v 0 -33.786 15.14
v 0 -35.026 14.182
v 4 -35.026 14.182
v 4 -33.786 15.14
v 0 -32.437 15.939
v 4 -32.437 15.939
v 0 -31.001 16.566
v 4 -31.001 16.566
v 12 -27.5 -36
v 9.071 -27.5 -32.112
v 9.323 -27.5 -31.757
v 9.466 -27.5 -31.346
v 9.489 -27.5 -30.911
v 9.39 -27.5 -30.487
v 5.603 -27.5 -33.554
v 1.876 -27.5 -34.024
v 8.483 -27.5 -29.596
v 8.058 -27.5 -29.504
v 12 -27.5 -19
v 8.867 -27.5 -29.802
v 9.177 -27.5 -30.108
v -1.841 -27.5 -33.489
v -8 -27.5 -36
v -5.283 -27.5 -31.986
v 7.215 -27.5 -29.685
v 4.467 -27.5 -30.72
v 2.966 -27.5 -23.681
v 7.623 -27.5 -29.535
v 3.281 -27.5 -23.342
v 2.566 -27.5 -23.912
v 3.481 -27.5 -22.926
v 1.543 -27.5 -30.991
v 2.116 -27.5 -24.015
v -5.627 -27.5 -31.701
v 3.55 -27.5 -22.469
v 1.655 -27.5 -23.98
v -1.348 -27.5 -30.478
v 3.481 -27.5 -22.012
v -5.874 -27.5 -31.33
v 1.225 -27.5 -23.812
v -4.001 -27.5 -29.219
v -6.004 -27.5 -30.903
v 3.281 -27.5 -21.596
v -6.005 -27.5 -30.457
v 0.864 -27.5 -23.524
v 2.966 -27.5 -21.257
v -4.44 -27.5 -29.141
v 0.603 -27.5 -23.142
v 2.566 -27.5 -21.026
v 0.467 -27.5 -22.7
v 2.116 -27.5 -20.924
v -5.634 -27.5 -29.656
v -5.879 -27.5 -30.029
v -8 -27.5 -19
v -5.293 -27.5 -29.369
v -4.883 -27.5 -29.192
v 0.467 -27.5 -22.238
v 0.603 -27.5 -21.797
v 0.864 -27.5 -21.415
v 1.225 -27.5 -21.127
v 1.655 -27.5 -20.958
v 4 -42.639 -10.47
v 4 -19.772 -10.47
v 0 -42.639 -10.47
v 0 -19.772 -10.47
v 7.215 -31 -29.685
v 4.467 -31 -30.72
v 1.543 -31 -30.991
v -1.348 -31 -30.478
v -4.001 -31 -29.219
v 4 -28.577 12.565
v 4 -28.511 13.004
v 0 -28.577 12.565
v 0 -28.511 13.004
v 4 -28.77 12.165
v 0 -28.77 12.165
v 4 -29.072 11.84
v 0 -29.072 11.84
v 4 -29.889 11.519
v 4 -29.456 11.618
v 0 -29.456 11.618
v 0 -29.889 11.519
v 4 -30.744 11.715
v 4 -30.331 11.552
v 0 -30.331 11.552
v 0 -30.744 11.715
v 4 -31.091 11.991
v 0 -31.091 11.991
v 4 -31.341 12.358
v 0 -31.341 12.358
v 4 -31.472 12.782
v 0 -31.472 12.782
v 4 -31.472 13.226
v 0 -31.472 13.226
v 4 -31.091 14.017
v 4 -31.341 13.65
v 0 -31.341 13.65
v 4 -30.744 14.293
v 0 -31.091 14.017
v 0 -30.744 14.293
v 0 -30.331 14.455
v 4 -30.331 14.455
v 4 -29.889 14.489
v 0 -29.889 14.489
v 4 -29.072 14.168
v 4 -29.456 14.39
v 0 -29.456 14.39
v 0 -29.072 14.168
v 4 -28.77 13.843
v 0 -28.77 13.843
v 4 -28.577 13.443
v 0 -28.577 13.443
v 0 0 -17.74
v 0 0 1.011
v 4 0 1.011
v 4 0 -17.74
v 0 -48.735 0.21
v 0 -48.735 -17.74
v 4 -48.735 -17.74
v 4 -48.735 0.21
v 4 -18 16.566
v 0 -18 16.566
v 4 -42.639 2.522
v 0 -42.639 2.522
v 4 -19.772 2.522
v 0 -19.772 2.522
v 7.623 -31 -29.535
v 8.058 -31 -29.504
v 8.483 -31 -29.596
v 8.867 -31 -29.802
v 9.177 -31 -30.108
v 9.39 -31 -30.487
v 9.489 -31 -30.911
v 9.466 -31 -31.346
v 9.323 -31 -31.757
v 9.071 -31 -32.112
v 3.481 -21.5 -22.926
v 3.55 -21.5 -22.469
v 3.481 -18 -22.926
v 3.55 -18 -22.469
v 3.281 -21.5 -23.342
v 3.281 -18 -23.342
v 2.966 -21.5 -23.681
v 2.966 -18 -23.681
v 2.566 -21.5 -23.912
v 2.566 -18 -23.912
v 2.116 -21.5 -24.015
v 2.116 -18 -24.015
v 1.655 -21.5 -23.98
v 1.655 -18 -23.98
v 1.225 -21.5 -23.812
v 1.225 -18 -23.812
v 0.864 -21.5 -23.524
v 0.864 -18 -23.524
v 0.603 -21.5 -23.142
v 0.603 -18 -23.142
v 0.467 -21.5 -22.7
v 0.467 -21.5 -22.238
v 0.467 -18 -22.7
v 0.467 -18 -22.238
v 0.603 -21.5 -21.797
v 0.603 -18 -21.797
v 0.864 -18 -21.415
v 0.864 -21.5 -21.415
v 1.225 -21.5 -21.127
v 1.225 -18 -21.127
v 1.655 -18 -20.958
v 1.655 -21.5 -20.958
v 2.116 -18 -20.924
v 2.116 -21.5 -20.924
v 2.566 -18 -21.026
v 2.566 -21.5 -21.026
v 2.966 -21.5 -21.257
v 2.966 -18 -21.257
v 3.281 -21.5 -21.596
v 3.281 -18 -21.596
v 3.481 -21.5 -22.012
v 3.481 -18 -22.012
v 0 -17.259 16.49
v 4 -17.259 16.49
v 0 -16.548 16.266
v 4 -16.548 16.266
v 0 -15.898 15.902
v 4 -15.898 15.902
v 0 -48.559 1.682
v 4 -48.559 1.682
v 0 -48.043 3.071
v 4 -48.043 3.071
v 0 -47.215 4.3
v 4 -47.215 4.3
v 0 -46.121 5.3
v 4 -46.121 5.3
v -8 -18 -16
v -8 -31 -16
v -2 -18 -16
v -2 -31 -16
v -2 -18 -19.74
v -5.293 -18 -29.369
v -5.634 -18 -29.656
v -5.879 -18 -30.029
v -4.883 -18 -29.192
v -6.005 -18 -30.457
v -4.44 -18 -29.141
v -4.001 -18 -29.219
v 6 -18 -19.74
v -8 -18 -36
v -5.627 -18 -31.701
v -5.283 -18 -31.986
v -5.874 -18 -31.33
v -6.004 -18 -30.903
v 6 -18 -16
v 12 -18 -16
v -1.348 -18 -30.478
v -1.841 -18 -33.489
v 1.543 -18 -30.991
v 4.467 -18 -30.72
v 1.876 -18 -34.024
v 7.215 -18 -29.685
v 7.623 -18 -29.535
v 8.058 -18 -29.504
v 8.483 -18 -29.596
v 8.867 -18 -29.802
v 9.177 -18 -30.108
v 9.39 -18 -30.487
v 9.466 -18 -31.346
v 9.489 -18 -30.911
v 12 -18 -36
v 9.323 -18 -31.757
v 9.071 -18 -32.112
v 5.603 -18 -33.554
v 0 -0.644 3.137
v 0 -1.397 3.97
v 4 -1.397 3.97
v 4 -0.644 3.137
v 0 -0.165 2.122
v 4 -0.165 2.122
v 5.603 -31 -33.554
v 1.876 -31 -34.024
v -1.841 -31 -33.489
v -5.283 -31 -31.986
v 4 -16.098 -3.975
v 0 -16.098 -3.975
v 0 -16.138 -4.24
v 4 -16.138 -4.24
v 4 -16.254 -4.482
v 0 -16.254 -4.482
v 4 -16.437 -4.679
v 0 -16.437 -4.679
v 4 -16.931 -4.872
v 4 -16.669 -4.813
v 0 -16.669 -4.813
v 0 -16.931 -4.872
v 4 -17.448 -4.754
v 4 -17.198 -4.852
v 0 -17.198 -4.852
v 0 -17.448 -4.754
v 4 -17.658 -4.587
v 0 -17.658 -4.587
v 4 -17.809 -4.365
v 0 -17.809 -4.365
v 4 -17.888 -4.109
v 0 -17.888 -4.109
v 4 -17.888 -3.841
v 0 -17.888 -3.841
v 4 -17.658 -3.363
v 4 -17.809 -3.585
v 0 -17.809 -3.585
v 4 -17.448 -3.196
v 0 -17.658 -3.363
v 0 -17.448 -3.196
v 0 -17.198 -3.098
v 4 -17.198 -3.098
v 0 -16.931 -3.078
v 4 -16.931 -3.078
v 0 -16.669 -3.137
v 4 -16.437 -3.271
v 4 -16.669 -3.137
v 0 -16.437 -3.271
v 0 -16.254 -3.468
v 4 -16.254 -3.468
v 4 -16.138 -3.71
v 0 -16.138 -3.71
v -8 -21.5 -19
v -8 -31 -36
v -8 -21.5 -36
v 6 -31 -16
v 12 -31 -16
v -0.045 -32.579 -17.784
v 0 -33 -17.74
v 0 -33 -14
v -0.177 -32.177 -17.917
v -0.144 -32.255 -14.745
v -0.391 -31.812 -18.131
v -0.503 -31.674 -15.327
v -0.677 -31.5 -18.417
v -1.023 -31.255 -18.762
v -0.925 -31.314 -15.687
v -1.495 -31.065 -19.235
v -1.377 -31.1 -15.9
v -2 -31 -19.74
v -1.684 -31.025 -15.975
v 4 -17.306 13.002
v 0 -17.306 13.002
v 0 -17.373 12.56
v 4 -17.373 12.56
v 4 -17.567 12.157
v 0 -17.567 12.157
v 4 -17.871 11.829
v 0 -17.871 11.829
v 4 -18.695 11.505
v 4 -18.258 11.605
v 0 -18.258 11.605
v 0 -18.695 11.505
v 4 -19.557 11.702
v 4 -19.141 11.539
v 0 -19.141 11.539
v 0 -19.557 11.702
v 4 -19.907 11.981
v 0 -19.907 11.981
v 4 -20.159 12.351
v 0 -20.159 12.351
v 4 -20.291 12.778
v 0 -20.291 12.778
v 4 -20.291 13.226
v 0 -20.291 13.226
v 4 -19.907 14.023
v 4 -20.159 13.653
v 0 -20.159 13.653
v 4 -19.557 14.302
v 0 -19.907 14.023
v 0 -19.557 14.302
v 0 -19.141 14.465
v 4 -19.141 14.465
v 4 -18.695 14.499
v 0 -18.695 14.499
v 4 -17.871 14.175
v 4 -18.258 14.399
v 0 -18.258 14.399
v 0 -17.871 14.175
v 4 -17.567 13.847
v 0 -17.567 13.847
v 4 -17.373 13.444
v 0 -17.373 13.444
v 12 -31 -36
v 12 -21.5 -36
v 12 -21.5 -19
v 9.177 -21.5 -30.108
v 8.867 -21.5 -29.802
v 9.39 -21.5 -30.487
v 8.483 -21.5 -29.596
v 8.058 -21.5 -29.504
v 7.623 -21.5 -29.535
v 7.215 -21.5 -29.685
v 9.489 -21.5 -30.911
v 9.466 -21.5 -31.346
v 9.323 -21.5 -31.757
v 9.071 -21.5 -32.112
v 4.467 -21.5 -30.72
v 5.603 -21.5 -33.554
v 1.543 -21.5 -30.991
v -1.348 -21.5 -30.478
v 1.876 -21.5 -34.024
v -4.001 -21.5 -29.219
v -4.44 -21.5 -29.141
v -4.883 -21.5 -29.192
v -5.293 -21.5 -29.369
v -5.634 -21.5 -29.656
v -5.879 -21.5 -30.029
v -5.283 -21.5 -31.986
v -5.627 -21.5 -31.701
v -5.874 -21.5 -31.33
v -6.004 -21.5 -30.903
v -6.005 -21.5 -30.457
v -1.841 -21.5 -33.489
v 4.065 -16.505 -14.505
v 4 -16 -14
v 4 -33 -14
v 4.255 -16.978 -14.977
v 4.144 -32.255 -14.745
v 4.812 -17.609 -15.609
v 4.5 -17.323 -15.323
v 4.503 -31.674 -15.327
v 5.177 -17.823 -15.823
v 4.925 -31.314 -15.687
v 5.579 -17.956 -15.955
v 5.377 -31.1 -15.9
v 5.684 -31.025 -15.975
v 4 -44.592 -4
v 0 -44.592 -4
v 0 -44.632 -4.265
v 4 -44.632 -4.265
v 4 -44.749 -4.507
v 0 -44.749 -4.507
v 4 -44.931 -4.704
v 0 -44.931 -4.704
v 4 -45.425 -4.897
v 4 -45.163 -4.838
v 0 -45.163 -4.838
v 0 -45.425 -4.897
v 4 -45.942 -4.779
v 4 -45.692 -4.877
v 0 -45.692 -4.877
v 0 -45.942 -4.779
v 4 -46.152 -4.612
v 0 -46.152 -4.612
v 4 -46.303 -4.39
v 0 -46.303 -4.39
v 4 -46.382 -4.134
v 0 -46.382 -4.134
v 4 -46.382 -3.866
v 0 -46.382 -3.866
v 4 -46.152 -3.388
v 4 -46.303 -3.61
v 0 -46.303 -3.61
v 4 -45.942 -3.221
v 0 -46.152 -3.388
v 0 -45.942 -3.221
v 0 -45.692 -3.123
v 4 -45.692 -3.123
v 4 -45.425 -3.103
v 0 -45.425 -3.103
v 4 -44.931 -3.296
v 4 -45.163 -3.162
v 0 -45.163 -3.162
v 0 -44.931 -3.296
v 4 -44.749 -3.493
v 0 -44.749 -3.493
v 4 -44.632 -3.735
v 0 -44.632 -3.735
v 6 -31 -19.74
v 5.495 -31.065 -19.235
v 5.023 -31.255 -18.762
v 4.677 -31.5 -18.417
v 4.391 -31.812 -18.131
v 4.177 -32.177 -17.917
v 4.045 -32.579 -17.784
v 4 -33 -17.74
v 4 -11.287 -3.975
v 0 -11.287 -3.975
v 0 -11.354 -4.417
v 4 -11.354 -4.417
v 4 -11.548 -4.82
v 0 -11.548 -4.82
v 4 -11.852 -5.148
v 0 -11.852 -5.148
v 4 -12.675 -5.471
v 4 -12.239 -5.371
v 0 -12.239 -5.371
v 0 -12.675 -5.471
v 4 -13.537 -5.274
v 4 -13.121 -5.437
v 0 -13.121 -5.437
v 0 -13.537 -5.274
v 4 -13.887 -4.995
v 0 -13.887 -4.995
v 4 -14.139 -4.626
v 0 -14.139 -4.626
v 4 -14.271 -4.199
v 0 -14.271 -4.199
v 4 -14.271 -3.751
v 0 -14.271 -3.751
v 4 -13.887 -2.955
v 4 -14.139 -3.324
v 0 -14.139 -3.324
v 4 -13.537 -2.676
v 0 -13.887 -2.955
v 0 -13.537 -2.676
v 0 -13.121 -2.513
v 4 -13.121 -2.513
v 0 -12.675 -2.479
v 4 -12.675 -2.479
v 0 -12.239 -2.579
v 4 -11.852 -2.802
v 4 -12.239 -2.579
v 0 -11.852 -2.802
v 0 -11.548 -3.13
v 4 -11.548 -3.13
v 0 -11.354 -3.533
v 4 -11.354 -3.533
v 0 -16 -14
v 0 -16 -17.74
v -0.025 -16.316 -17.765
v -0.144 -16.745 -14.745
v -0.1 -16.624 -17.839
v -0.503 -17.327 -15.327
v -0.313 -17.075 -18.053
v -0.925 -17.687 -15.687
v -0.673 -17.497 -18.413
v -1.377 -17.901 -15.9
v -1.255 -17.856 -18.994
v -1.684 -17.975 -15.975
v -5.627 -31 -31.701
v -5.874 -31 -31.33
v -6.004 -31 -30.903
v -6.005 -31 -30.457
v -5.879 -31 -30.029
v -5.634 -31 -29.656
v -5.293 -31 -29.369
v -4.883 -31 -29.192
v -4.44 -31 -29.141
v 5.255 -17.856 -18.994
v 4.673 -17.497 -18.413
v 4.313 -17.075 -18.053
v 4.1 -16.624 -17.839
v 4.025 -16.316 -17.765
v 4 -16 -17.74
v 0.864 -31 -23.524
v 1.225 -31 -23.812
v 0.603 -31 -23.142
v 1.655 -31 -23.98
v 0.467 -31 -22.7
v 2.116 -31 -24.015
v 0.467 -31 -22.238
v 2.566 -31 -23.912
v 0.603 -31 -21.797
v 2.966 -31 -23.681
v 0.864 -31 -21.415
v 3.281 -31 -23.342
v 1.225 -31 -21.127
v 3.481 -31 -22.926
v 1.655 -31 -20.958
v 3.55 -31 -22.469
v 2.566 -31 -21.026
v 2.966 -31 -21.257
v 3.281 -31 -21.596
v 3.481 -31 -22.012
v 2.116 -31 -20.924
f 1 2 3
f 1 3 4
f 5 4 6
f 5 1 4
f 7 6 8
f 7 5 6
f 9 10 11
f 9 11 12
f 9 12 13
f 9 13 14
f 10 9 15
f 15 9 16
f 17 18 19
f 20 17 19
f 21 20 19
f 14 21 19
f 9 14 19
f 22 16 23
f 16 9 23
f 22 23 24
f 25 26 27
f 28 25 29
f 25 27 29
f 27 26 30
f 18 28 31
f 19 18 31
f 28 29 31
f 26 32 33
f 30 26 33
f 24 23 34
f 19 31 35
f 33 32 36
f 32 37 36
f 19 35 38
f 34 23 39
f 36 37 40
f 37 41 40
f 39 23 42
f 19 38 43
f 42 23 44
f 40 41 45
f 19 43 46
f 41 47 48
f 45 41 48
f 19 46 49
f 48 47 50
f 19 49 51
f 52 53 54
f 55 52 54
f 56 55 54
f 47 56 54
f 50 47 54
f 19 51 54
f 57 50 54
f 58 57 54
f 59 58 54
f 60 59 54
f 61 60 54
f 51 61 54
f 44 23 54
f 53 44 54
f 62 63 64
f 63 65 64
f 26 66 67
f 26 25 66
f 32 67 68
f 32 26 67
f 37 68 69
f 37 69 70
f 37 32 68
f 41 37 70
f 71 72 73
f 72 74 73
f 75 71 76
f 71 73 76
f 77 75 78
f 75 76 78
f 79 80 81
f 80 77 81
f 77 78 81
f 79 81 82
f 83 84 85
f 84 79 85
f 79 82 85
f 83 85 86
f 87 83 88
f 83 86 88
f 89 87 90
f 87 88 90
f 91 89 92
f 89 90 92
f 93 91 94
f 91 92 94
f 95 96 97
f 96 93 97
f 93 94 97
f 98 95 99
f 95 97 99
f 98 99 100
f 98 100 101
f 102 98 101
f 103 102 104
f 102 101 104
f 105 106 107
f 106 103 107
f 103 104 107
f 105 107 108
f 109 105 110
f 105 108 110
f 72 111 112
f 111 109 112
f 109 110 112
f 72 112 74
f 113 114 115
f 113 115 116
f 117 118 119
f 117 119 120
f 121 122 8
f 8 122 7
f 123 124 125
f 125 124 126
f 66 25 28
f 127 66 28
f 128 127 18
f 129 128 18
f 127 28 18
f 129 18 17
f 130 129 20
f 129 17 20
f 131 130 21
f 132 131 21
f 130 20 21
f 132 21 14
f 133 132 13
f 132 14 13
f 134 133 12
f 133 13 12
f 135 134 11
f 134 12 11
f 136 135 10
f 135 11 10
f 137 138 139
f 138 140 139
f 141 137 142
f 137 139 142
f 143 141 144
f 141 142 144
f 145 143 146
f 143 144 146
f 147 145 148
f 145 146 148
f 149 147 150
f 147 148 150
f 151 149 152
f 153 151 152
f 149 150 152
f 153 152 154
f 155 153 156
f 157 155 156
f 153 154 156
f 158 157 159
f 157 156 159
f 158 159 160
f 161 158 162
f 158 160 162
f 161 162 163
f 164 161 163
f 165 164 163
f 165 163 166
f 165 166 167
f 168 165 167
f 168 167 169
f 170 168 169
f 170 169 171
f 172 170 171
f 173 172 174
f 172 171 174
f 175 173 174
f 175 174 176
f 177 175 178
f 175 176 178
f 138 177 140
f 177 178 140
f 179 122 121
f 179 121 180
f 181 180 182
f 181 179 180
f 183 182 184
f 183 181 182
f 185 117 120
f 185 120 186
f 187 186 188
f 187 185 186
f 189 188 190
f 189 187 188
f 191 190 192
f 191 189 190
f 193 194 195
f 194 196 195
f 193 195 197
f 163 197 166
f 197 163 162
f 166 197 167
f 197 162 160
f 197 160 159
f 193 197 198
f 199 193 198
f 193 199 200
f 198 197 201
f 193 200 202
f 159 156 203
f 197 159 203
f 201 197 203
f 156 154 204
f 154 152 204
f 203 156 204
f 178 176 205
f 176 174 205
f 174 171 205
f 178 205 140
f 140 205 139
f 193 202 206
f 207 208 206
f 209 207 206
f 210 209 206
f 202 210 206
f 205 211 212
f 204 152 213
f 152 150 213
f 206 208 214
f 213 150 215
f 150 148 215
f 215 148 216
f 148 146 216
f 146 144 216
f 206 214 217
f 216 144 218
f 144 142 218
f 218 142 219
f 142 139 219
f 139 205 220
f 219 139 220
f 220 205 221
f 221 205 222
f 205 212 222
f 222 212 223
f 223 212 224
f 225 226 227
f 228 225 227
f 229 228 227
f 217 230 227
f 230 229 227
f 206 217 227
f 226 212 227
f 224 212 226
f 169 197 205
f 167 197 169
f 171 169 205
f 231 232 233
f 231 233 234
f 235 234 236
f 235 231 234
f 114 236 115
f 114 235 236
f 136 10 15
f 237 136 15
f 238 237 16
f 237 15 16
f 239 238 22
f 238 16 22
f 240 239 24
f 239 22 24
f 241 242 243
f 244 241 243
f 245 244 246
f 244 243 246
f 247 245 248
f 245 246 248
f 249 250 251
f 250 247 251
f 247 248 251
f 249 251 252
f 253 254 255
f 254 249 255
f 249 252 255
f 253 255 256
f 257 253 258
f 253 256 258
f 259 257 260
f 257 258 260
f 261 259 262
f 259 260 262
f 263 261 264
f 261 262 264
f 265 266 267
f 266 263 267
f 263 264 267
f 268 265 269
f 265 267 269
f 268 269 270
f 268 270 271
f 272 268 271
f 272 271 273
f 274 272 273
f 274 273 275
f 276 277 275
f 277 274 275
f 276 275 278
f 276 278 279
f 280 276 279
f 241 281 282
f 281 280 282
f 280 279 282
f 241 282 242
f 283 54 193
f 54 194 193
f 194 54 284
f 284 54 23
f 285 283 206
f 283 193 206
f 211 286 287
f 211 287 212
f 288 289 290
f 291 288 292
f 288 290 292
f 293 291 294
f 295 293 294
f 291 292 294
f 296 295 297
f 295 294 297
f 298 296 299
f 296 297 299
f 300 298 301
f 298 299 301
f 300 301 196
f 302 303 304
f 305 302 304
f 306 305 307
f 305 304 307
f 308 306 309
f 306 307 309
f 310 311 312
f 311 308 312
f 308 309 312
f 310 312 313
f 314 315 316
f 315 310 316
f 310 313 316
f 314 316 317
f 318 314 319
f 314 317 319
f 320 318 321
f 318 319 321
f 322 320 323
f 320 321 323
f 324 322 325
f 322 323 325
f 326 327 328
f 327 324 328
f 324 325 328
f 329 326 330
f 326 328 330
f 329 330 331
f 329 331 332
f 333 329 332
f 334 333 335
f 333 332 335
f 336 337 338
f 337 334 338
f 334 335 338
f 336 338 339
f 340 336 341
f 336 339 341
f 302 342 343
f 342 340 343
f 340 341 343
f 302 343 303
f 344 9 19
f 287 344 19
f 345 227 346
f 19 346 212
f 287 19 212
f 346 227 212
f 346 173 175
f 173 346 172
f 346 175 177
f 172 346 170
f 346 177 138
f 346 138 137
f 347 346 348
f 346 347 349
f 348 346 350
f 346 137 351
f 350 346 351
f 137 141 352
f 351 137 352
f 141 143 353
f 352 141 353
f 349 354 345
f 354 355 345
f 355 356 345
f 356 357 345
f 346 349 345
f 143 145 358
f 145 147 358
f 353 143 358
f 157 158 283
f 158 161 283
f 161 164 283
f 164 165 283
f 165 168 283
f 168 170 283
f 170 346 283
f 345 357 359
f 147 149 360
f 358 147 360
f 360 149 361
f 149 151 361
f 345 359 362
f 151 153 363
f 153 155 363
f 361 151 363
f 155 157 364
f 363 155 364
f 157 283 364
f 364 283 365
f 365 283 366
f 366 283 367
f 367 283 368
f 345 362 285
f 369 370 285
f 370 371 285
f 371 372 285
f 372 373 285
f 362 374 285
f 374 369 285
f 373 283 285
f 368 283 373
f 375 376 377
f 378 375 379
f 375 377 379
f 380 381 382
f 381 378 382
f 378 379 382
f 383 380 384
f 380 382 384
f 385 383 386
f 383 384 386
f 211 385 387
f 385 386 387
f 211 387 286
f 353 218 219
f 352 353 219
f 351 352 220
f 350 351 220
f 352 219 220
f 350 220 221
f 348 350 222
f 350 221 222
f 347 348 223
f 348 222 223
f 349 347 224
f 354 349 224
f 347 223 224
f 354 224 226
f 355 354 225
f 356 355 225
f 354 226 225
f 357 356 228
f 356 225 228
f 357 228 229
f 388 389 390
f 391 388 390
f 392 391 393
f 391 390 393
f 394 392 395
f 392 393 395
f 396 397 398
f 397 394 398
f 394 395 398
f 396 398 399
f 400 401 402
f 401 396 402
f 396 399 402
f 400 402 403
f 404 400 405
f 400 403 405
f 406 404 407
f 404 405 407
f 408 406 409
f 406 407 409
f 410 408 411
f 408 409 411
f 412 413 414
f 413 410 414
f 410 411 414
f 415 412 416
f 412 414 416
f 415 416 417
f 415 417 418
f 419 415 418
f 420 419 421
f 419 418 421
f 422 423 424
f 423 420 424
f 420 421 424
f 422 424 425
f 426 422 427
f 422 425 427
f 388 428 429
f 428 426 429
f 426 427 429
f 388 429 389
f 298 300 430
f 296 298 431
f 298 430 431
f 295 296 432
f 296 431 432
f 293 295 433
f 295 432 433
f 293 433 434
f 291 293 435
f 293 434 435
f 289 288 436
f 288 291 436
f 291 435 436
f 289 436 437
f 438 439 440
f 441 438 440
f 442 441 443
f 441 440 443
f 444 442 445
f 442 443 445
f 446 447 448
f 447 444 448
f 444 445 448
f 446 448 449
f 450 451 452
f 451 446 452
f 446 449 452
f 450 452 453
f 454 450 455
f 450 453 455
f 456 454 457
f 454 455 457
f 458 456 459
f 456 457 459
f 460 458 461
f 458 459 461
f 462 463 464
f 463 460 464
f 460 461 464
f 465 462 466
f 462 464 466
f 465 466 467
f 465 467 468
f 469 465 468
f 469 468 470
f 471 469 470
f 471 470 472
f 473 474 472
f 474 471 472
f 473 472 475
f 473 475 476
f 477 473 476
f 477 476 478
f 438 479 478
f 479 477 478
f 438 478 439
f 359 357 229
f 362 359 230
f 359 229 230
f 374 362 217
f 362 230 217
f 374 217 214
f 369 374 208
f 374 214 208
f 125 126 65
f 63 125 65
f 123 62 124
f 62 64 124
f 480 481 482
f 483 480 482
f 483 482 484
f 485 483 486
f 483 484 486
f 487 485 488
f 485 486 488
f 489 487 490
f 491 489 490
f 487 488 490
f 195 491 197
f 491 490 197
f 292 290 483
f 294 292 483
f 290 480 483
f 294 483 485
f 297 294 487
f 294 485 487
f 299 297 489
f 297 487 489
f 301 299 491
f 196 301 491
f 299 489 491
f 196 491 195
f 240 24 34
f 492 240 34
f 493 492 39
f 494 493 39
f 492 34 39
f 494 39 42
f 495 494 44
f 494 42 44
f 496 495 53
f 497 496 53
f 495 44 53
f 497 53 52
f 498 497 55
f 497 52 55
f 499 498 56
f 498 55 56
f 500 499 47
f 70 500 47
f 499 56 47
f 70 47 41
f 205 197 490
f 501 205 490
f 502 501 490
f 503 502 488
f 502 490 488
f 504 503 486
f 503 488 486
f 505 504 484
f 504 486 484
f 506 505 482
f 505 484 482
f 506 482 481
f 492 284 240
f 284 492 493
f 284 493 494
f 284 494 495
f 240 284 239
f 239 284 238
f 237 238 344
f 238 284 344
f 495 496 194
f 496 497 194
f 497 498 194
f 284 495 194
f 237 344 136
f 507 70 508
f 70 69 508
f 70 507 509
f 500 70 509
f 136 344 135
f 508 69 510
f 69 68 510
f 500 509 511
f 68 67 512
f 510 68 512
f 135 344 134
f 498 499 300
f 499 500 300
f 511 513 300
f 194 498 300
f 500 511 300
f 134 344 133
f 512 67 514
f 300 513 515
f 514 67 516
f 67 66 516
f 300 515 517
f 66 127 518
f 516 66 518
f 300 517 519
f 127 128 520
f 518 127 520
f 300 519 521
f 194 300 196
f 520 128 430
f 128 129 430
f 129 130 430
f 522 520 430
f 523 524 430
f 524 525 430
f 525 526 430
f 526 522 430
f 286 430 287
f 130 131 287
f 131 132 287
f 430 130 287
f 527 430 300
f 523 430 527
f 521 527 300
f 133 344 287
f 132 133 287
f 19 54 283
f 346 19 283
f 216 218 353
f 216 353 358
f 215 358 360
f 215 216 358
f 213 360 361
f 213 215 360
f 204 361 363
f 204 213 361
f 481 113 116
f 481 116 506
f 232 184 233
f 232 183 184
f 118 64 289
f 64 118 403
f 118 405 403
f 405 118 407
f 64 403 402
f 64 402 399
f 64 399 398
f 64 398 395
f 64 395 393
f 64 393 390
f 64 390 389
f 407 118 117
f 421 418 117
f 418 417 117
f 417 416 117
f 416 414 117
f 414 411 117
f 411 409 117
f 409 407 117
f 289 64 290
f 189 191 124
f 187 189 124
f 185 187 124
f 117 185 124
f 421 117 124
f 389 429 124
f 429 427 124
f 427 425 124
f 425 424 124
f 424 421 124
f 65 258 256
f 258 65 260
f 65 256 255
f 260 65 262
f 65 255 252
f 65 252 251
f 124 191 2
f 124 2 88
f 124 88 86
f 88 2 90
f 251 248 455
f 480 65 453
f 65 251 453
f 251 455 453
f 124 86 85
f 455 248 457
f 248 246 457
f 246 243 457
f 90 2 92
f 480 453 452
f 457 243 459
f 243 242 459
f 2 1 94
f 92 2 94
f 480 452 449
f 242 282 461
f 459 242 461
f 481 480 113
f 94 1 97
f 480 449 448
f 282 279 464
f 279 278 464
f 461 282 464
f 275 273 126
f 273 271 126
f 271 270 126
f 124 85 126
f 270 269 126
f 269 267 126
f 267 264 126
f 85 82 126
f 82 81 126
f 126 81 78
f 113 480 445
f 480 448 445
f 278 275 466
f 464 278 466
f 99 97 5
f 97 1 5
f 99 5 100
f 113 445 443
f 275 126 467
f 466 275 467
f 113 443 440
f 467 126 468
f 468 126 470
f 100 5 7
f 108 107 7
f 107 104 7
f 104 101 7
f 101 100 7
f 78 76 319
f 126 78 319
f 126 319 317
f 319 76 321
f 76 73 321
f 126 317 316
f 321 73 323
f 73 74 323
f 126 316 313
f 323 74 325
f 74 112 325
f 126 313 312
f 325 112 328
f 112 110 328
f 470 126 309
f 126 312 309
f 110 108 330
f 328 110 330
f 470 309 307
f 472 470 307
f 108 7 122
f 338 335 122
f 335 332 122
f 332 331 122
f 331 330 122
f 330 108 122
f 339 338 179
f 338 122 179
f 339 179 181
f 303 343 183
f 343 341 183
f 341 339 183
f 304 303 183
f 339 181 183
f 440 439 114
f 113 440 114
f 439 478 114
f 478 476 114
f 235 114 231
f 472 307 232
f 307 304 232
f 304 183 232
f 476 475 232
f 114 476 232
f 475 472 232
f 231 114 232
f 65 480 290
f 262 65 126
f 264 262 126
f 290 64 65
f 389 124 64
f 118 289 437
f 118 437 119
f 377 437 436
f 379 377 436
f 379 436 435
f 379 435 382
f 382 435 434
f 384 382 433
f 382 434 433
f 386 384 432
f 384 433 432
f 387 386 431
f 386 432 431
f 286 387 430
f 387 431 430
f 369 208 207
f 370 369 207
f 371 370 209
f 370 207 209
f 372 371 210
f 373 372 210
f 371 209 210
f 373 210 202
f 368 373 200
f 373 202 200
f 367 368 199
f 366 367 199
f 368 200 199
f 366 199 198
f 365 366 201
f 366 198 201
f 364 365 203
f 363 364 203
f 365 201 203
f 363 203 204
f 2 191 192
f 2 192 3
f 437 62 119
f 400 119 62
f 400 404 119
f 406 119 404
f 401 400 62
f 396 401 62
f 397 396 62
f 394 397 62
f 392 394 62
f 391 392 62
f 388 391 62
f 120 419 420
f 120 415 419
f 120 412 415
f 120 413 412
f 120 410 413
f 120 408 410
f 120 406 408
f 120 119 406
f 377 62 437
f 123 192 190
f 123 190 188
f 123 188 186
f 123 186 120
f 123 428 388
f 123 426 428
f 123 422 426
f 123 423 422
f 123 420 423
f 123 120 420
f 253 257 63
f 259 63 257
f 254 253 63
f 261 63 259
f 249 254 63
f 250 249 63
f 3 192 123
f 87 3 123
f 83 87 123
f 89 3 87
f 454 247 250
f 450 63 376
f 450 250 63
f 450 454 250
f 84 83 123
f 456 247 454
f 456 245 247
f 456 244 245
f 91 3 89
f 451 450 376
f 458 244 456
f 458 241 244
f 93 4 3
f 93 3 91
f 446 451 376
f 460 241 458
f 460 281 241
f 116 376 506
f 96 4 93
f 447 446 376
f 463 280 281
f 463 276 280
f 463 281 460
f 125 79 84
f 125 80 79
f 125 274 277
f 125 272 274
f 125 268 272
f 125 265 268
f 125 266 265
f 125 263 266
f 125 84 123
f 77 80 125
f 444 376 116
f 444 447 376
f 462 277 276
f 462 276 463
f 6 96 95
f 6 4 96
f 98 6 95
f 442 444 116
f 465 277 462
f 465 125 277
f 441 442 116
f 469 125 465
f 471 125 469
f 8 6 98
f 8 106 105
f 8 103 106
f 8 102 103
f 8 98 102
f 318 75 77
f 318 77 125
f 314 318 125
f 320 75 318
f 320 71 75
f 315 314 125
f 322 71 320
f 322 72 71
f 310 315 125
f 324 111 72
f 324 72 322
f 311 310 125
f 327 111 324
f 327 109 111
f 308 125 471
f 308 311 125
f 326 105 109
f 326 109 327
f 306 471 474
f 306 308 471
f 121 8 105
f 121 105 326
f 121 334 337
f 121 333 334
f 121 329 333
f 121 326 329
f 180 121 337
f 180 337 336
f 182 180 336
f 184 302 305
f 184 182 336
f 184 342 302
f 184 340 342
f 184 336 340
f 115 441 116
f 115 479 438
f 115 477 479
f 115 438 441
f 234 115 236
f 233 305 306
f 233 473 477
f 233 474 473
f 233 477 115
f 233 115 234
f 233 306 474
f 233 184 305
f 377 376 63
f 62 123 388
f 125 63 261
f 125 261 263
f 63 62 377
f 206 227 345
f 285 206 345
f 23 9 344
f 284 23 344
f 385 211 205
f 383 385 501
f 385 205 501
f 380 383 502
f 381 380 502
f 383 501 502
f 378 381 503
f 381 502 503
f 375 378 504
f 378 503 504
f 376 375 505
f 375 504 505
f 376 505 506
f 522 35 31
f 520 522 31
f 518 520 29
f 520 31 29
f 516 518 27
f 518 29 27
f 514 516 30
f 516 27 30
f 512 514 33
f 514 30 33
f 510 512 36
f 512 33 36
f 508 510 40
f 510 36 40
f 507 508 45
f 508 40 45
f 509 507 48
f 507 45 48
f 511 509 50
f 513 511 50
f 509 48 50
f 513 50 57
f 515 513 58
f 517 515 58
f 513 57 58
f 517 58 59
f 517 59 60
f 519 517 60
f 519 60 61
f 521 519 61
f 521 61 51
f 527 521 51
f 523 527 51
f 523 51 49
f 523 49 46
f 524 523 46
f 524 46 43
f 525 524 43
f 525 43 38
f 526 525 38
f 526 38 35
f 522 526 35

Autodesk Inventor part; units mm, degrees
ref_plane "YZ Plane" through (0, 0, 0) normal (1, 0, 0) x (0, 1, 0)
ref_plane "XZ Plane" through (0, 0, 0) normal (0, 1, 0) x (-1, 0, 0)
ref_plane "XY Plane" through (0, 0, 0) normal (0, 0, 1) x (1, 0, 0)
sketch "Szkic1" plane through (0, 0, 0) normal (1, 0, 0) x (0, 1, 0)
  line L0 (0, 1.0111) -> (0, -17.7395)
  line L1 (0, -17.7395) -> (-48.7346, -17.7395)
  line L2 (-48.7346, -17.7395) -> (-48.7346, 0.2105)
  arc A0 (-46.1212, 5.2996) -> (-48.7346, 0.2105) centre (-42.4729, 0.2105) ccw
  line L3 (-46.1212, 5.2996) -> (-35.0263, 14.1821)
  arc A1 (-31.0007, 16.5663) -> (-35.0263, 14.1821) centre (-26.6278, 4.5922) ccw
  arc A2 (-15.4691, 15.5487) -> (-18, 16.5663) centre (-18, 12.9101) ccw
  arc A3 (0, 1.0111) -> (-1.3971, 3.9699) centre (-3.8316, 1.0111) ccw
  line L4 (-15.8982, 15.9018) -> (-1.3971, 3.9699)
  line L5 (-18, 16.5663) -> (-31.0007, 16.5663)
  circle A4 centre (-18.8067, 13.002) radius 1.5007
  circle A5 centre (-30, 13.0039) radius 1.4888
  circle A6 centre (-45.4922, -4) radius 0.9
  circle A7 centre (-12.7873, -3.975) radius 1.5
  circle A8 centre (-16.9979, -3.975) radius 0.9
  line L6 (-19.7721, 2.5223) -> (-19.7721, -10.4698)
  line L7 (-19.7721, -10.4698) -> (-42.6386, -10.4698)
  line L8 (-42.6386, -10.4698) -> (-42.6386, 2.5223)
  line L9 (-42.6386, 2.5223) -> (-19.7721, 2.5223)
  point P0 (0, 0)
  point P1 (0, -22.6354)
  dimension "d0" = 1.8
  dimension "d1" = 3
  dimension "d2" = 1.8
extrude "Wyciągnięcie proste1" add sketch "Szkic1" along normal blind 4 contours L0 L1 L2 A0 L3 A1 L5 A2 L4 A3
sketch "Szkic2" plane through (4, 0, 0) normal (1, 0, 0) x (0, 0, -1)
  line L0 (-16.5663, -18) -> (-16.5663, -31.0007) projected
  line L1 (-16.5663, -24.5004) -> (42, -24.5004)
  line L2 (16, -18.0004) -> (36, -18.0004)
  line L3 (36, -18.0004) -> (36, -31.0004)
  line L4 (36, -31.0004) -> (16, -31.0004)
  line L5 (16, -31.0004) -> (16, -18.0004)
  point P0 (0, 0)
  dimension "d5" = 20
  dimension "d6" = 13
extrude "Wyciągnięcie proste2" add sketch "Szkic2" against normal blind 12
sketch "Szkic3" plane through (-8, 0, 0) normal (-1, 0, 0) x (0, 0, 1)
  line L0 (-17.7395, -18.0004) -> (-16, -18.0004) projected
  line L1 (-36, -31.0004) -> (-17.7395, -31.0004) projected
  line L2 (-16, -18.0004) -> (-36, -18.0004)
  line L3 (-36, -18.0004) -> (-36, -31.0004)
  line L4 (-36, -31.0004) -> (-16, -31.0004)
  line L5 (-16, -31.0004) -> (-16, -18.0004)
  point P0 (0, 0)
extrude "Wyciągnięcie proste3" add sketch "Szkic3" against normal blind 20
sketch "Szkic4" plane through (-8, -31.0004, -36) normal (0, 0, -1) x (-1, 0, 0)
  point P0 (-8, 31.0004)
sketch "Szkic5" plane through (-8, 0, 0) normal (-1, 0, 0) x (0, 0, 1)
  line L0 (-36, -18.0004) -> (-36, -31.0004) projected
  line L1 (-36, -27.5004) -> (-19, -27.5004)
  line L2 (-19, -27.5004) -> (-19, -21.5004)
  line L3 (-19, -21.5004) -> (-36, -21.5004)
  line L4 (-36, -21.5004) -> (-36, -27.5004)
  line L5 (-16, -31.0004) -> (-16, -18.0004) projected
  line L6 (-16, -24.5004) -> (-39.2975, -24.5004)
  line L7 (-20, -27) -> (-36, -27)
  line L8 (-36, -27) -> (-36, -21)
  line L9 (-36, -21) -> (-20, -21)
  line L10 (-20, -21) -> (-20, -27)
  point P0 (0, 0)
  dimension "d23" = 6
fillet "Zaokrąglenie1" radius 2 8 edges at (0, -31.0004, -16.8697) (0, -24.5004, -16) (0, -18.0004, -16.8697) (2, -18.0004, -17.7395) (4, -18.0004, -16.8697) (4, -24.5004, -16) (4, -31.0004, -16.8697) (2, -31.0004, -17.7395)
sketch "Szkic6" plane through (-8, -18.0004, -16) normal (0, 1, 0) x (1, 0, 0)
  line L0 (20, 20) -> (0, 20) projected
  line L1 (10, 20) -> (10, -8)
  circle A0 centre (10, 6.4693) radius 1.55
  arc A1 (15.9953, 14.4545) -> (4.2067, 14.6022) centre (10, 6.4693) ccw
  arc A2 (17.6193, 17.0025) -> (1.6495, 16.4327) centre (10, 6.4693) ccw
  arc A3 (15.9953, 14.4545) -> (17.6193, 17.0025) centre (16.7323, 15.7763) ccw
  arc A4 (1.6495, 16.4327) -> (4.2067, 14.6022) centre (3.2422, 15.9562) ccw
  line L2 (15.8971, 14.5272) -> (16.0005, 14.4516)
  line L3 (1.7865, 16.546) -> (1.6196, 16.3179)
  point P0 (8, -16)
  dimension "d14" = 3.1
  dimension "d17" = 26
extrude "Wyciągnięcie proste5" cut sketch "Szkic6" against normal blind 20 contours A0 L1 | L1 A0
sketch "Szkic7" plane through (-8, -18.0004, -16) normal (0, 1, 0) x (1, 0, 0)
  line L0 (0, 20) -> (20, 20) projected
  line L1 (10, 20) -> (10, -4.2283)
  line L2 (20, 20) -> (20, 0) projected
  circle A0 centre (10, 4) radius 11
  circle A1 centre (10, 4) radius 14.025
  arc A2 (15.2148, 13.6853) -> (17.0707, 16.1122) centre (15.9483, 15.0475) ccw
  arc A3 (2.7167, 15.9856) -> (3.9993, 13.2191) centre (3.5134, 14.6744) ccw
  point P0 (8, -16)
  dimension "d18" = 10
  dimension "d19" = 22
  dimension "d20" = 28.05
extrude "Wyciągnięcie proste6" cut sketch "Szkic7" against normal blind 20 contours A1 A2 A0 L1 | L1 A0 A3 A1
extrude "Wyciągnięcie proste7" cut sketch "Szkic5" against normal up to next contours L3 L10 L6 L0 | L6 L10 L7 L0 | L3 L2 L6 L10 | L7 L10 L6 L2 L1 L0
properties part number "czesc glowna chwytaka"
